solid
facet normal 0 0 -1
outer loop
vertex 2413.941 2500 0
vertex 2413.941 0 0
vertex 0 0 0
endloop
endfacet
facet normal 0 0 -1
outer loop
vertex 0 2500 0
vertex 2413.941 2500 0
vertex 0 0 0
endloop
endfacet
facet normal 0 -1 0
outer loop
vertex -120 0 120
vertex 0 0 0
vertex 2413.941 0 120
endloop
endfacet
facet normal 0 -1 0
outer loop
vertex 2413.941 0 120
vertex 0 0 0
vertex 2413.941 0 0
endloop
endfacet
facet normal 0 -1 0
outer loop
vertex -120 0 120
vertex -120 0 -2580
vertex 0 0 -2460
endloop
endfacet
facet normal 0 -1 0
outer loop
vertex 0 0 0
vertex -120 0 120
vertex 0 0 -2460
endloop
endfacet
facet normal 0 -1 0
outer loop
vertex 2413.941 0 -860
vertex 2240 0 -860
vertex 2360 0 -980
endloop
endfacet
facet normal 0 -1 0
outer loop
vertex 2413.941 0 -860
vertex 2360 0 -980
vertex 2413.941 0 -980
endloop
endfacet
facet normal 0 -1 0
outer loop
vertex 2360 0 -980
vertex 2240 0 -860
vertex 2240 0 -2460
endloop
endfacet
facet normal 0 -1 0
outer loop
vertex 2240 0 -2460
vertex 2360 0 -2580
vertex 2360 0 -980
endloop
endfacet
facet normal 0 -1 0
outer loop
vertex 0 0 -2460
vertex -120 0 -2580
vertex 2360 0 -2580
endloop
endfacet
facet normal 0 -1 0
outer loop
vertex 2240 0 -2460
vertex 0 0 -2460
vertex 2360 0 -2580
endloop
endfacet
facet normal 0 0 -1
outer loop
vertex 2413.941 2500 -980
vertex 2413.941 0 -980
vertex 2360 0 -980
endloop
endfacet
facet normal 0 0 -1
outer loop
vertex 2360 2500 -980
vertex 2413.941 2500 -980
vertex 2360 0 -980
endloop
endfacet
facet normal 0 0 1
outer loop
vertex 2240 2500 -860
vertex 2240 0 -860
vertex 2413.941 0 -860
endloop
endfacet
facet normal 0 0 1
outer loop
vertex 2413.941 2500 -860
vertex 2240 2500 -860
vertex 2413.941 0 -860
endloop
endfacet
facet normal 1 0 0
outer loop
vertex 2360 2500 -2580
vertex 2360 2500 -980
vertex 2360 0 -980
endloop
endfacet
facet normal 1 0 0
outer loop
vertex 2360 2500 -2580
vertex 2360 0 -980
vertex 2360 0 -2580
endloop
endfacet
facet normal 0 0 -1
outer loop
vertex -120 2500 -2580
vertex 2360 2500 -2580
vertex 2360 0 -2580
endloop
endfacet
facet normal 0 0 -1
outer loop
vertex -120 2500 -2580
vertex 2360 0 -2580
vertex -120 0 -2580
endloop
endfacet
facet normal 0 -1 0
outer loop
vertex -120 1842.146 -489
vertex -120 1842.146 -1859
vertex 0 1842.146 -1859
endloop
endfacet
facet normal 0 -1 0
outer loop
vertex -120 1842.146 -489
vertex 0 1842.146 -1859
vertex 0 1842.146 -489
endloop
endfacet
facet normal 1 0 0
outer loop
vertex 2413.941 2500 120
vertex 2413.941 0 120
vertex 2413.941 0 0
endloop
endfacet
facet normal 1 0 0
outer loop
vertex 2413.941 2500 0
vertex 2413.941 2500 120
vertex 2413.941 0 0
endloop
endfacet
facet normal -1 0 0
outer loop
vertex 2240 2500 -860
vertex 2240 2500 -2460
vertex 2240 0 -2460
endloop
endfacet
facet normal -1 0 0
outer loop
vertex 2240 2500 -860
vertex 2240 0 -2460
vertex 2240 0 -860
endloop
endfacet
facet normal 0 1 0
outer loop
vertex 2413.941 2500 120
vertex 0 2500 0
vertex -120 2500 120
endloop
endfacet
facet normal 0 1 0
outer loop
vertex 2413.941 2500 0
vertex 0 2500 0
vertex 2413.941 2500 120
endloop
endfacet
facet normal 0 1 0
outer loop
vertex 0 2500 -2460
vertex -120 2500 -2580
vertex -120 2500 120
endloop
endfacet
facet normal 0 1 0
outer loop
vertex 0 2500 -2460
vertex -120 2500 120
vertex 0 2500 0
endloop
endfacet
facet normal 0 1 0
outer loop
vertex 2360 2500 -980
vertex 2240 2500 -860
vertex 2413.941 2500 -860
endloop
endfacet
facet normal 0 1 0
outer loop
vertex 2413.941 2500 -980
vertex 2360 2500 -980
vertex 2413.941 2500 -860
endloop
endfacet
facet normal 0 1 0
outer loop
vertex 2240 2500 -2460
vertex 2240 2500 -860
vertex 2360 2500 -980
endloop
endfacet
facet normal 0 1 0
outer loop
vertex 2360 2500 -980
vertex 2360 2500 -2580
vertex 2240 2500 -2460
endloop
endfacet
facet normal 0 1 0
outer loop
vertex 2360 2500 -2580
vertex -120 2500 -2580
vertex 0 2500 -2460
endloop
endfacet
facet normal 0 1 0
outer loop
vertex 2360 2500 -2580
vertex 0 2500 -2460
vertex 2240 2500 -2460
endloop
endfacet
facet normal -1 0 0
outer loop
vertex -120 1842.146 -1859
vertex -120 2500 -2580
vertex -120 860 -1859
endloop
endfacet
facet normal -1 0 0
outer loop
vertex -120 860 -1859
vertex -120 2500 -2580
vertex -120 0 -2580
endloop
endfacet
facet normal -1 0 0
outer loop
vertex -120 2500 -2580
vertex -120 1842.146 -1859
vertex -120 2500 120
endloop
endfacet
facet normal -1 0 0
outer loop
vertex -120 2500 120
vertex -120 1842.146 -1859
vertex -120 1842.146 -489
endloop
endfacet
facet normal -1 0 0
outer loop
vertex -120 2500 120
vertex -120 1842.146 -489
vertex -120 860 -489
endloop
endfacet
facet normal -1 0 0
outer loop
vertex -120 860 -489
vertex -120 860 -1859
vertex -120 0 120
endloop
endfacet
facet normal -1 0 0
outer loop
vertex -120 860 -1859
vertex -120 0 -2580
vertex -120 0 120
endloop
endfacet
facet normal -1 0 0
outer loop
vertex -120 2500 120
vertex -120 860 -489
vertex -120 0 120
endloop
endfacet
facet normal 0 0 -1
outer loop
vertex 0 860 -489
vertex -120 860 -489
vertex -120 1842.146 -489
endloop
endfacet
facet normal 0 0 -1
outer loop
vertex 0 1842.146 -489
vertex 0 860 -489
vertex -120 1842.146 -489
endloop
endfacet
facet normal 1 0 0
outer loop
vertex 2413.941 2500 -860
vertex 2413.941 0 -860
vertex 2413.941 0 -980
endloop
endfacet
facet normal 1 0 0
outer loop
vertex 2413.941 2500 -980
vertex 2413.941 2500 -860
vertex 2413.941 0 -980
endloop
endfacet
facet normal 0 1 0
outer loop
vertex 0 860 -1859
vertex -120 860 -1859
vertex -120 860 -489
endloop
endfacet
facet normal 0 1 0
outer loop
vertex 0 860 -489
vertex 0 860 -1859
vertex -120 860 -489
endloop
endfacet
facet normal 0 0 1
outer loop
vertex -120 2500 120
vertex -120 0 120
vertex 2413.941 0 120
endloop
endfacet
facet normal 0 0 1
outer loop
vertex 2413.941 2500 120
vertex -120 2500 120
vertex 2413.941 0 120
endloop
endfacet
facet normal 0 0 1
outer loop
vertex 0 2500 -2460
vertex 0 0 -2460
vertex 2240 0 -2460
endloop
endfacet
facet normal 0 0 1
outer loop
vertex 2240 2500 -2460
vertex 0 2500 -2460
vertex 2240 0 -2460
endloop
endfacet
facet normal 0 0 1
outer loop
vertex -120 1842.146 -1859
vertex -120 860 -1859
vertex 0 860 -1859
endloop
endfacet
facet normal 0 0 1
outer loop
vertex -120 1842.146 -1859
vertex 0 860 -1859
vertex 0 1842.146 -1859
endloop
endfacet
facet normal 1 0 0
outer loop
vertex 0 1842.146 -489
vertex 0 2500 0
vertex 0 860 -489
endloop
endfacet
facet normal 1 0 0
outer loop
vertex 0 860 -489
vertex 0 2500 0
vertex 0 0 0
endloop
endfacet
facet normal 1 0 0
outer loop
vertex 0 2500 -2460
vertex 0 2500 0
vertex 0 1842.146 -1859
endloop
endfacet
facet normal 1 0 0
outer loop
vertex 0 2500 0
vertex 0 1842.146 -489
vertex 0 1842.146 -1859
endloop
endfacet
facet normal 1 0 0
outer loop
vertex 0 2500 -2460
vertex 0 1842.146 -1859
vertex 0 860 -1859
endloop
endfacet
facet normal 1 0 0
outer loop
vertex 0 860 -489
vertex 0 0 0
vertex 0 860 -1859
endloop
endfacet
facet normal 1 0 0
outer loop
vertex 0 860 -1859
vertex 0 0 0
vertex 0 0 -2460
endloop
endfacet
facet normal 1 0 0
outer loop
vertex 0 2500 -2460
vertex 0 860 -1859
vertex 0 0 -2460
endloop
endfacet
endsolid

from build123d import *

# Parameters (mm, degrees)
EXTRUDE_1_DEPTH     = 2500
CUT_EXTRUDE_1_REACH = 2535.941
SKETCH_2_W          = 1370
SKETCH_2_H          = 982.146059398


with BuildPart() as part:
    # Эскиз1 → Вытянуть-Тонкостенный1 (new body)
    with BuildSketch(Plane(origin=(0, 0, 0), x_dir=(1, 0, 0), z_dir=(0, 1, 0))):
        Polygon((2413.940825756, 0), (0, 0), (0, 2460), (2240, 2460), (2240, 860), (2413.940825756, 860), (2413.940825756, 980), (2360, 980), (2360, 2580), (-120, 2580), (-120, -120), (2413.940825756, -120), align=None)
    extrude(amount=EXTRUDE_1_DEPTH)

    # Эскиз2 → Вырез-Вытянуть1 (cut, up to next)
    with BuildSketch(Plane.ZY.offset(120), mode=Mode.PRIVATE) as cut_extrude_1_sk1:
        with Locations((-1174, 1351.073029699)):
            Rectangle(SKETCH_2_W, SKETCH_2_H)
    cut_extrude_1_tool1 = extrude(cut_extrude_1_sk1.sketch, amount=-CUT_EXTRUDE_1_REACH, mode=Mode.PRIVATE) & part.part
    add(cut_extrude_1_tool1.solids().sort_by_distance((-120, 1351.07303, -1174))[0], mode=Mode.SUBTRACT)


solid = part.part
